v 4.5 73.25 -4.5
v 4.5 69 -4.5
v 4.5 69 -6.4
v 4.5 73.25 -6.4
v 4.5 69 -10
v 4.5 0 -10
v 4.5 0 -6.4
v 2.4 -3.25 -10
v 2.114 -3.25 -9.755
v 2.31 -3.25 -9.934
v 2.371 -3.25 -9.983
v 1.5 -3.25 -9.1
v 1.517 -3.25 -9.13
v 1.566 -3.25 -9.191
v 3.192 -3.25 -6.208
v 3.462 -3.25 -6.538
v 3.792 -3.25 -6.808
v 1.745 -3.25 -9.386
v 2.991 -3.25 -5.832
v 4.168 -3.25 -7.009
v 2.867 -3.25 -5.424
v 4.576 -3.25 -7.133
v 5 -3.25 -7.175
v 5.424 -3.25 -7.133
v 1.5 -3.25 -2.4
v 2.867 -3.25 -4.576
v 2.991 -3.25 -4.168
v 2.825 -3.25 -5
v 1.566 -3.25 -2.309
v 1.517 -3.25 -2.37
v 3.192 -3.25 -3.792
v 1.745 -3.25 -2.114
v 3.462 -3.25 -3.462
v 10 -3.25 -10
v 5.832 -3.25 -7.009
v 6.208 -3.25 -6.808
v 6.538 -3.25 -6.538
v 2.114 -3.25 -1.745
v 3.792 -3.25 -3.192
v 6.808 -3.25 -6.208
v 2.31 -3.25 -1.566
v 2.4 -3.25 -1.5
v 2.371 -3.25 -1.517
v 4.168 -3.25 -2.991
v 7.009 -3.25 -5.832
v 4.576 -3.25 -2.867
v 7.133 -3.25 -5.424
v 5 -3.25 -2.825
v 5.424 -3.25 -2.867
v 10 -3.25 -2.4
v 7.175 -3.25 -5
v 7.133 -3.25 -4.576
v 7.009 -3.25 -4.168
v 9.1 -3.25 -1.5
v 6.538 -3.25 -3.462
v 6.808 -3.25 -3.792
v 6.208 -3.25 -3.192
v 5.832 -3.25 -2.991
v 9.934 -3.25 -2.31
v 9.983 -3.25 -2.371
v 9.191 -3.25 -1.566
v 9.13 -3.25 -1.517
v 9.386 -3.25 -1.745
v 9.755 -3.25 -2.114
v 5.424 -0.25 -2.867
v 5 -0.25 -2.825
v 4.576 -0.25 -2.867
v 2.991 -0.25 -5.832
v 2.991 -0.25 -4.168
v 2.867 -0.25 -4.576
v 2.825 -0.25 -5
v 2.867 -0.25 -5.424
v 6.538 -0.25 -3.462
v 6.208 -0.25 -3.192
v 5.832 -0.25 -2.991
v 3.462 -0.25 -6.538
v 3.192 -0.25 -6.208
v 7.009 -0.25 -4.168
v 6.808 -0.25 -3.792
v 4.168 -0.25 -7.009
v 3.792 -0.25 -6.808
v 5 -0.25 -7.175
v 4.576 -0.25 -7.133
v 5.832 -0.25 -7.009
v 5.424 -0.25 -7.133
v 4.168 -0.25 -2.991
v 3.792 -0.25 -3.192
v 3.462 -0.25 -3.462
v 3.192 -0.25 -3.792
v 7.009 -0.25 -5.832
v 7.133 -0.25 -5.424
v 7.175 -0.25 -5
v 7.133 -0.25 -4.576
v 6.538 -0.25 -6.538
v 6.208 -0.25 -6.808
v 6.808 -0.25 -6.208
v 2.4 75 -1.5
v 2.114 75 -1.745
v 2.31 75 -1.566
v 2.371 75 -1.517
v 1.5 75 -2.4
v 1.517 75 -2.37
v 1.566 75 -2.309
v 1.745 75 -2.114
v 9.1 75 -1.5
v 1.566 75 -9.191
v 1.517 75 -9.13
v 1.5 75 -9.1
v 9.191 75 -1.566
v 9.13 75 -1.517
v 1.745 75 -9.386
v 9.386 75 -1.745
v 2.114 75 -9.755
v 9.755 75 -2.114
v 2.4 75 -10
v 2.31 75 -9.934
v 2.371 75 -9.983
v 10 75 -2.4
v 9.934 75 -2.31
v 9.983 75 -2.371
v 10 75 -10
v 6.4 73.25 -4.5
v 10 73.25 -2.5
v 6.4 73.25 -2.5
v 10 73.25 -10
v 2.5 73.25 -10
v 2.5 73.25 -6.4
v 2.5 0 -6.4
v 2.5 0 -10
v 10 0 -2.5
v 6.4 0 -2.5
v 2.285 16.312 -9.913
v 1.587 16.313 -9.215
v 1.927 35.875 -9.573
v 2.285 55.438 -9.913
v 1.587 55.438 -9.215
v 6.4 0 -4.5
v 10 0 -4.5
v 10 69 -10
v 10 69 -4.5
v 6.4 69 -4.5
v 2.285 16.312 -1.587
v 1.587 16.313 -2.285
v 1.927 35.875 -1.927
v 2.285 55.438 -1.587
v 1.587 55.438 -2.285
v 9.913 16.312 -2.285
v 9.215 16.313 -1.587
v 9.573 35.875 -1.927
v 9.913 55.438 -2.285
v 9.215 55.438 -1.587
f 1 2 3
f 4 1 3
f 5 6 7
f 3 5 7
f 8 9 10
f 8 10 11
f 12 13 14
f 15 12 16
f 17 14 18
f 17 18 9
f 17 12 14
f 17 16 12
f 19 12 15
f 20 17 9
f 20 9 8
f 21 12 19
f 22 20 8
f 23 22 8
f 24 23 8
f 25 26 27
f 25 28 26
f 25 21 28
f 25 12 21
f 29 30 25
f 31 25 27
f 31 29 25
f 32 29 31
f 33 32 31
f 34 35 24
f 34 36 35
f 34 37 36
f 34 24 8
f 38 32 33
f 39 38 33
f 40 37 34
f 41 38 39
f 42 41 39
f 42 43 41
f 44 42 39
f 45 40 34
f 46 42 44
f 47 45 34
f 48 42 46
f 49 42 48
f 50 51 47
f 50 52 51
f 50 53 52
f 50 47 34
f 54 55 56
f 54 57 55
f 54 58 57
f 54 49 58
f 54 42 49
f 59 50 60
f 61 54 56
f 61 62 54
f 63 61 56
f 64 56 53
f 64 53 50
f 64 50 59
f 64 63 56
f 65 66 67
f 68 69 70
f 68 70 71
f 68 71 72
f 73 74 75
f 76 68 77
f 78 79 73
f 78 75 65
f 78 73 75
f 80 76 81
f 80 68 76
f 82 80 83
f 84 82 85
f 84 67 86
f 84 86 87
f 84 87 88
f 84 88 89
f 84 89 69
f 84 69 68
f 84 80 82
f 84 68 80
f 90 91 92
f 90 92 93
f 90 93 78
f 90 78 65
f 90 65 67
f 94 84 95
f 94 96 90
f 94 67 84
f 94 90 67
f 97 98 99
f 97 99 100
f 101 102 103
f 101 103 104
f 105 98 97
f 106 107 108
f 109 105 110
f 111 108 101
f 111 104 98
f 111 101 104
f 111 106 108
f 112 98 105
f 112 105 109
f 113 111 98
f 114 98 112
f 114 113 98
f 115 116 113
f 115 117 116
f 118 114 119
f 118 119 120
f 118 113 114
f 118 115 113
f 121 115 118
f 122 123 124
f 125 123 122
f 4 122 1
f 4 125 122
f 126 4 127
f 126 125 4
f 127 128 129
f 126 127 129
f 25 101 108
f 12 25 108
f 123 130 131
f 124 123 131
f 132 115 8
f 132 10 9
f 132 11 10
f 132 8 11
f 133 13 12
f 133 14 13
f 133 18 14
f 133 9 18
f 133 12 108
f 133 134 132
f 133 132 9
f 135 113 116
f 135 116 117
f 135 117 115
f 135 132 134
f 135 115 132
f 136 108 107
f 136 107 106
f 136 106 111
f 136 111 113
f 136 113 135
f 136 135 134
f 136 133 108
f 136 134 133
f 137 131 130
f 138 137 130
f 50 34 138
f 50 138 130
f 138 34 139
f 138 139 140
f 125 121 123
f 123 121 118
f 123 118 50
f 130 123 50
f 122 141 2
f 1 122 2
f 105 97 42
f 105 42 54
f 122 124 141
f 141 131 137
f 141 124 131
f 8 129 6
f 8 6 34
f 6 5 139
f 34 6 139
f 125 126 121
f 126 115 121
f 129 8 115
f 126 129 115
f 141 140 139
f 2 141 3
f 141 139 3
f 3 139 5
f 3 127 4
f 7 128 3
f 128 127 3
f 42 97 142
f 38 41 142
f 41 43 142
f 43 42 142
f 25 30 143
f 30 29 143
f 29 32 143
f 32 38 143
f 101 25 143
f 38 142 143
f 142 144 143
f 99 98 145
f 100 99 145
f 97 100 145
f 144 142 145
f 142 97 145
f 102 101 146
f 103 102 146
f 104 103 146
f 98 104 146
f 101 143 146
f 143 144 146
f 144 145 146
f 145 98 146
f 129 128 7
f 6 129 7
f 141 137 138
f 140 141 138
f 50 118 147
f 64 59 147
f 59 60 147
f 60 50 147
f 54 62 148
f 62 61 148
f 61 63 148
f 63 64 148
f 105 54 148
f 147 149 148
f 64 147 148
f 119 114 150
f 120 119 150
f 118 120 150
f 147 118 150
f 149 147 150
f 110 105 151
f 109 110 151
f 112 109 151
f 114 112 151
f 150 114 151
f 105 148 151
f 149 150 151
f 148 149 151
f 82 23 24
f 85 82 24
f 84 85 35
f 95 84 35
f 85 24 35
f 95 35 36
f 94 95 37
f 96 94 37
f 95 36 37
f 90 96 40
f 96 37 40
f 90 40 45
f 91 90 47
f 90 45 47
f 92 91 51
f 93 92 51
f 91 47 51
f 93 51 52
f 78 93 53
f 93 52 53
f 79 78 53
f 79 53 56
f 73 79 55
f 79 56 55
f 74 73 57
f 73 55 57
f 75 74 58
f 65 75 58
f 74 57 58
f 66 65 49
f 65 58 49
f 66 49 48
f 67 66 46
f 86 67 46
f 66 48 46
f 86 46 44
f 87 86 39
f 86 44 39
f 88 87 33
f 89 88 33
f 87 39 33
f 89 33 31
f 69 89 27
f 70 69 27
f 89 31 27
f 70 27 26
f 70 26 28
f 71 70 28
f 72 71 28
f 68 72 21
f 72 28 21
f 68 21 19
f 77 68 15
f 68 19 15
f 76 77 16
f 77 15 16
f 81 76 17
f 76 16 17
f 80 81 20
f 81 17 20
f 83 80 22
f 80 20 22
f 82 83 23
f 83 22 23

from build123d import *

# Parameters (mm, degrees)
SKETCH1_W           = 10
SKETCH1_H           = 10
BOSS_EXTRUDE1_DEPTH = 75
SKETCH3_W           = 7.5
SKETCH3_H           = 4.25
CUT_EXTRUDE1_DEPTH  = 7.5
SKETCH4_W           = 2
SKETCH4_H           = 5.5
CUT_EXTRUDE2_DEPTH  = 73.25
SKETCH5_W           = 10
SKETCH5_H           = 10
BOSS_EXTRUDE2_DEPTH = 3.25
BOSS_EXTRUDE3_REACH = 78.322
SKETCH6_W           = 1
SKETCH6_H           = 1.9
SKETCH6_H_2         = 2
SKETCH7_R           = 2.175
CUT_EXTRUDE3_DEPTH  = 3
SKETCH8_W           = 8.5
SKETCH8_H           = 1.5
CUT_EXTRUDE4_DEPTH  = 80.517686712
FILLET1_SIZE        = 0.9


with BuildPart() as part:
    # Sketch1 → Boss-Extrude1 (new body)
    with BuildSketch(Plane(origin=(0, 0, 0), x_dir=(1, 0, 0), z_dir=(0, 1, 0))):
        with Locations((5, 5)):
            Rectangle(SKETCH1_W, SKETCH1_H)
    extrude(amount=BOSS_EXTRUDE1_DEPTH)

    # Sketch3 → Cut-Extrude1 (cut)
    with BuildSketch(Plane(origin=(0, 0, -10), x_dir=(-1, 0, 0), z_dir=(0, 0, -1))):
        with Locations((-6.25, 71.125)):
            Rectangle(SKETCH3_W, SKETCH3_H)
    extrude(amount=-CUT_EXTRUDE1_DEPTH, mode=Mode.SUBTRACT)

    # Sketch4 → Cut-Extrude2 (cut)
    with BuildSketch(Plane.XZ):
        Polygon((10, -2.5), (2.5, -2.5), (2.5, -4.5), (4.5, -4.5), (10, -4.5), align=None)
        with Locations((3.5, -7.25)):
            Rectangle(SKETCH4_W, SKETCH4_H)
    extrude(amount=-CUT_EXTRUDE2_DEPTH, mode=Mode.SUBTRACT)


with BuildPart() as cut_extrude2_piece_1:
    # of the separate pieces the step leaves, piece 1, a body of its own (cut_extrude2_pieces)
    add(part.part.solids().sort_by_distance((0, 0, 0))[0])



with BuildPart() as cut_extrude2_piece_2:
    # of the separate pieces the step leaves, piece 2, a body of its own (cut_extrude2_pieces)
    add(part.part.solids().sort_by_distance((10, 0, -4.5))[0])


with BuildPart() as cut_extrude2_piece_1_1:
    add(cut_extrude2_piece_1.part)

    add(cut_extrude2_piece_2.part)  # Boss-Extrude2 merges Cut-Extrude2 piece 2
    # Sketch5 → Boss-Extrude2 (add)
    with BuildSketch(Plane.XZ):
        with Locations((5, -5)):
            Rectangle(SKETCH5_W, SKETCH5_H)
    extrude(amount=BOSS_EXTRUDE2_DEPTH)

    # Boss-Extrude3: up to this face of the body (flat: up to its plane)
    boss_extrude3_end = Plane(cut_extrude2_piece_1_1.part.faces().sort_by_distance((6.25, 73.25, -6.25))[0])
    # Sketch6 → Boss-Extrude3 (add, up to the picked face)
    with BuildSketch(Plane(origin=(0, 0, 0), x_dir=(1, 0, 0), z_dir=(0, 1, 0)), mode=Mode.PRIVATE) as boss_extrude3_sk1:
        Polygon((3.5, 4.5), (3.5, 2.5), (6.4, 2.5), (6.4, 4.5), (4.5, 4.5), align=None)
    boss_extrude3_tool1 = split(extrude(boss_extrude3_sk1.sketch, amount=BOSS_EXTRUDE3_REACH, mode=Mode.PRIVATE), bisect_by=boss_extrude3_end, keep=Keep.BOTH, mode=Mode.PRIVATE)
    # Sketch6 → Boss-Extrude3 (add, up to the picked face)
    with BuildSketch(Plane(origin=(0, 0, 0), x_dir=(1, 0, 0), z_dir=(0, 1, 0)), mode=Mode.PRIVATE) as boss_extrude3_sk2:
        with Locations((4, 5.45)):
            Rectangle(SKETCH6_W, SKETCH6_H)
    boss_extrude3_tool2 = split(extrude(boss_extrude3_sk2.sketch, amount=BOSS_EXTRUDE3_REACH, mode=Mode.PRIVATE), bisect_by=boss_extrude3_end, keep=Keep.BOTH, mode=Mode.PRIVATE)
    # Sketch6 → Boss-Extrude3 (add, up to the picked face)
    with BuildSketch(Plane(origin=(0, 0, 0), x_dir=(1, 0, 0), z_dir=(0, 1, 0)), mode=Mode.PRIVATE) as boss_extrude3_sk3:
        with Locations((3, 5.45)):
            Rectangle(SKETCH6_W, SKETCH6_H)
    boss_extrude3_tool3 = split(extrude(boss_extrude3_sk3.sketch, amount=BOSS_EXTRUDE3_REACH, mode=Mode.PRIVATE), bisect_by=boss_extrude3_end, keep=Keep.BOTH, mode=Mode.PRIVATE)
    # Sketch6 → Boss-Extrude3 (add, up to the picked face)
    with BuildSketch(Plane(origin=(0, 0, 0), x_dir=(1, 0, 0), z_dir=(0, 1, 0)), mode=Mode.PRIVATE) as boss_extrude3_sk4:
        with Locations((3, 3.5)):
            Rectangle(SKETCH6_W, SKETCH6_H_2)
    boss_extrude3_tool4 = split(extrude(boss_extrude3_sk4.sketch, amount=BOSS_EXTRUDE3_REACH, mode=Mode.PRIVATE), bisect_by=boss_extrude3_end, keep=Keep.BOTH, mode=Mode.PRIVATE)
    add(boss_extrude3_tool1.solids().sort_by(Axis((4.95, 0, -3.5), (0, 1, 0)))[0])
    add(boss_extrude3_tool2.solids().sort_by(Axis((4, 0, -5.45), (0, 1, 0)))[0])
    add(boss_extrude3_tool3.solids().sort_by(Axis((3, 0, -5.45), (0, 1, 0)))[0])
    add(boss_extrude3_tool4.solids().sort_by(Axis((3, 0, -3.5), (0, 1, 0)))[0])

    # Sketch7 → Cut-Extrude3 (cut)
    with BuildSketch(Plane.XZ.offset(3.25)):
        with Locations(Location((5, -5, 0), (0, 0, 270))):
            Circle(SKETCH7_R)
    extrude(amount=-CUT_EXTRUDE3_DEPTH, mode=Mode.SUBTRACT)

    # Sketch8 → Cut-Extrude4 (cut, through all)
    with BuildSketch(Plane(origin=(0, 75, 0), x_dir=(1, 0, 0), z_dir=(0, 1, 0))):
        Polygon((1.5, 10), (0, 10), (0, 0), (1.5, 0), (1.5, 1.5), align=None)
        with Locations((5.75, 0.75)):
            Rectangle(SKETCH8_W, SKETCH8_H)
    extrude(amount=-CUT_EXTRUDE4_DEPTH, mode=Mode.SUBTRACT)

    # Fillet1
    # a fillet whose section is not a circle: 0.9 mm, written as the material it takes off along each edge
    with BuildSketch(Plane(origin=(10, 77.25, -1.5), x_dir=(0, 0, -1), z_dir=(0, -1, 0)), Plane(origin=(1.5, 77.25, -1.5), x_dir=(1, 0, 0), z_dir=(0, -1, 0))) as fillet1_piece_1:
        with BuildLine():
            Bezier((FILLET1_SIZE, 0), (0, 0), (0, -FILLET1_SIZE), weights=[1, 0.052631579, 1])
            Line((0, -FILLET1_SIZE), (0, 0))
            Line((0, 0), (FILLET1_SIZE, 0))
        make_face()
    extrude(amount=82.75, mode=Mode.SUBTRACT)
    with BuildSketch(Plane(origin=(1.5, 77.25, -10), x_dir=(1, 0, 0), z_dir=(0, -1, 0))) as fillet1_piece_2:
        with BuildLine():
            Bezier((FILLET1_SIZE, 0), (0, 0), (0, FILLET1_SIZE), weights=[1, 0.052631579, 1])
            Line((0, FILLET1_SIZE), (0, 0))
            Line((0, 0), (FILLET1_SIZE, 0))
        make_face()
    extrude(amount=82.75, mode=Mode.SUBTRACT)


solid = cut_extrude2_piece_1_1.part
